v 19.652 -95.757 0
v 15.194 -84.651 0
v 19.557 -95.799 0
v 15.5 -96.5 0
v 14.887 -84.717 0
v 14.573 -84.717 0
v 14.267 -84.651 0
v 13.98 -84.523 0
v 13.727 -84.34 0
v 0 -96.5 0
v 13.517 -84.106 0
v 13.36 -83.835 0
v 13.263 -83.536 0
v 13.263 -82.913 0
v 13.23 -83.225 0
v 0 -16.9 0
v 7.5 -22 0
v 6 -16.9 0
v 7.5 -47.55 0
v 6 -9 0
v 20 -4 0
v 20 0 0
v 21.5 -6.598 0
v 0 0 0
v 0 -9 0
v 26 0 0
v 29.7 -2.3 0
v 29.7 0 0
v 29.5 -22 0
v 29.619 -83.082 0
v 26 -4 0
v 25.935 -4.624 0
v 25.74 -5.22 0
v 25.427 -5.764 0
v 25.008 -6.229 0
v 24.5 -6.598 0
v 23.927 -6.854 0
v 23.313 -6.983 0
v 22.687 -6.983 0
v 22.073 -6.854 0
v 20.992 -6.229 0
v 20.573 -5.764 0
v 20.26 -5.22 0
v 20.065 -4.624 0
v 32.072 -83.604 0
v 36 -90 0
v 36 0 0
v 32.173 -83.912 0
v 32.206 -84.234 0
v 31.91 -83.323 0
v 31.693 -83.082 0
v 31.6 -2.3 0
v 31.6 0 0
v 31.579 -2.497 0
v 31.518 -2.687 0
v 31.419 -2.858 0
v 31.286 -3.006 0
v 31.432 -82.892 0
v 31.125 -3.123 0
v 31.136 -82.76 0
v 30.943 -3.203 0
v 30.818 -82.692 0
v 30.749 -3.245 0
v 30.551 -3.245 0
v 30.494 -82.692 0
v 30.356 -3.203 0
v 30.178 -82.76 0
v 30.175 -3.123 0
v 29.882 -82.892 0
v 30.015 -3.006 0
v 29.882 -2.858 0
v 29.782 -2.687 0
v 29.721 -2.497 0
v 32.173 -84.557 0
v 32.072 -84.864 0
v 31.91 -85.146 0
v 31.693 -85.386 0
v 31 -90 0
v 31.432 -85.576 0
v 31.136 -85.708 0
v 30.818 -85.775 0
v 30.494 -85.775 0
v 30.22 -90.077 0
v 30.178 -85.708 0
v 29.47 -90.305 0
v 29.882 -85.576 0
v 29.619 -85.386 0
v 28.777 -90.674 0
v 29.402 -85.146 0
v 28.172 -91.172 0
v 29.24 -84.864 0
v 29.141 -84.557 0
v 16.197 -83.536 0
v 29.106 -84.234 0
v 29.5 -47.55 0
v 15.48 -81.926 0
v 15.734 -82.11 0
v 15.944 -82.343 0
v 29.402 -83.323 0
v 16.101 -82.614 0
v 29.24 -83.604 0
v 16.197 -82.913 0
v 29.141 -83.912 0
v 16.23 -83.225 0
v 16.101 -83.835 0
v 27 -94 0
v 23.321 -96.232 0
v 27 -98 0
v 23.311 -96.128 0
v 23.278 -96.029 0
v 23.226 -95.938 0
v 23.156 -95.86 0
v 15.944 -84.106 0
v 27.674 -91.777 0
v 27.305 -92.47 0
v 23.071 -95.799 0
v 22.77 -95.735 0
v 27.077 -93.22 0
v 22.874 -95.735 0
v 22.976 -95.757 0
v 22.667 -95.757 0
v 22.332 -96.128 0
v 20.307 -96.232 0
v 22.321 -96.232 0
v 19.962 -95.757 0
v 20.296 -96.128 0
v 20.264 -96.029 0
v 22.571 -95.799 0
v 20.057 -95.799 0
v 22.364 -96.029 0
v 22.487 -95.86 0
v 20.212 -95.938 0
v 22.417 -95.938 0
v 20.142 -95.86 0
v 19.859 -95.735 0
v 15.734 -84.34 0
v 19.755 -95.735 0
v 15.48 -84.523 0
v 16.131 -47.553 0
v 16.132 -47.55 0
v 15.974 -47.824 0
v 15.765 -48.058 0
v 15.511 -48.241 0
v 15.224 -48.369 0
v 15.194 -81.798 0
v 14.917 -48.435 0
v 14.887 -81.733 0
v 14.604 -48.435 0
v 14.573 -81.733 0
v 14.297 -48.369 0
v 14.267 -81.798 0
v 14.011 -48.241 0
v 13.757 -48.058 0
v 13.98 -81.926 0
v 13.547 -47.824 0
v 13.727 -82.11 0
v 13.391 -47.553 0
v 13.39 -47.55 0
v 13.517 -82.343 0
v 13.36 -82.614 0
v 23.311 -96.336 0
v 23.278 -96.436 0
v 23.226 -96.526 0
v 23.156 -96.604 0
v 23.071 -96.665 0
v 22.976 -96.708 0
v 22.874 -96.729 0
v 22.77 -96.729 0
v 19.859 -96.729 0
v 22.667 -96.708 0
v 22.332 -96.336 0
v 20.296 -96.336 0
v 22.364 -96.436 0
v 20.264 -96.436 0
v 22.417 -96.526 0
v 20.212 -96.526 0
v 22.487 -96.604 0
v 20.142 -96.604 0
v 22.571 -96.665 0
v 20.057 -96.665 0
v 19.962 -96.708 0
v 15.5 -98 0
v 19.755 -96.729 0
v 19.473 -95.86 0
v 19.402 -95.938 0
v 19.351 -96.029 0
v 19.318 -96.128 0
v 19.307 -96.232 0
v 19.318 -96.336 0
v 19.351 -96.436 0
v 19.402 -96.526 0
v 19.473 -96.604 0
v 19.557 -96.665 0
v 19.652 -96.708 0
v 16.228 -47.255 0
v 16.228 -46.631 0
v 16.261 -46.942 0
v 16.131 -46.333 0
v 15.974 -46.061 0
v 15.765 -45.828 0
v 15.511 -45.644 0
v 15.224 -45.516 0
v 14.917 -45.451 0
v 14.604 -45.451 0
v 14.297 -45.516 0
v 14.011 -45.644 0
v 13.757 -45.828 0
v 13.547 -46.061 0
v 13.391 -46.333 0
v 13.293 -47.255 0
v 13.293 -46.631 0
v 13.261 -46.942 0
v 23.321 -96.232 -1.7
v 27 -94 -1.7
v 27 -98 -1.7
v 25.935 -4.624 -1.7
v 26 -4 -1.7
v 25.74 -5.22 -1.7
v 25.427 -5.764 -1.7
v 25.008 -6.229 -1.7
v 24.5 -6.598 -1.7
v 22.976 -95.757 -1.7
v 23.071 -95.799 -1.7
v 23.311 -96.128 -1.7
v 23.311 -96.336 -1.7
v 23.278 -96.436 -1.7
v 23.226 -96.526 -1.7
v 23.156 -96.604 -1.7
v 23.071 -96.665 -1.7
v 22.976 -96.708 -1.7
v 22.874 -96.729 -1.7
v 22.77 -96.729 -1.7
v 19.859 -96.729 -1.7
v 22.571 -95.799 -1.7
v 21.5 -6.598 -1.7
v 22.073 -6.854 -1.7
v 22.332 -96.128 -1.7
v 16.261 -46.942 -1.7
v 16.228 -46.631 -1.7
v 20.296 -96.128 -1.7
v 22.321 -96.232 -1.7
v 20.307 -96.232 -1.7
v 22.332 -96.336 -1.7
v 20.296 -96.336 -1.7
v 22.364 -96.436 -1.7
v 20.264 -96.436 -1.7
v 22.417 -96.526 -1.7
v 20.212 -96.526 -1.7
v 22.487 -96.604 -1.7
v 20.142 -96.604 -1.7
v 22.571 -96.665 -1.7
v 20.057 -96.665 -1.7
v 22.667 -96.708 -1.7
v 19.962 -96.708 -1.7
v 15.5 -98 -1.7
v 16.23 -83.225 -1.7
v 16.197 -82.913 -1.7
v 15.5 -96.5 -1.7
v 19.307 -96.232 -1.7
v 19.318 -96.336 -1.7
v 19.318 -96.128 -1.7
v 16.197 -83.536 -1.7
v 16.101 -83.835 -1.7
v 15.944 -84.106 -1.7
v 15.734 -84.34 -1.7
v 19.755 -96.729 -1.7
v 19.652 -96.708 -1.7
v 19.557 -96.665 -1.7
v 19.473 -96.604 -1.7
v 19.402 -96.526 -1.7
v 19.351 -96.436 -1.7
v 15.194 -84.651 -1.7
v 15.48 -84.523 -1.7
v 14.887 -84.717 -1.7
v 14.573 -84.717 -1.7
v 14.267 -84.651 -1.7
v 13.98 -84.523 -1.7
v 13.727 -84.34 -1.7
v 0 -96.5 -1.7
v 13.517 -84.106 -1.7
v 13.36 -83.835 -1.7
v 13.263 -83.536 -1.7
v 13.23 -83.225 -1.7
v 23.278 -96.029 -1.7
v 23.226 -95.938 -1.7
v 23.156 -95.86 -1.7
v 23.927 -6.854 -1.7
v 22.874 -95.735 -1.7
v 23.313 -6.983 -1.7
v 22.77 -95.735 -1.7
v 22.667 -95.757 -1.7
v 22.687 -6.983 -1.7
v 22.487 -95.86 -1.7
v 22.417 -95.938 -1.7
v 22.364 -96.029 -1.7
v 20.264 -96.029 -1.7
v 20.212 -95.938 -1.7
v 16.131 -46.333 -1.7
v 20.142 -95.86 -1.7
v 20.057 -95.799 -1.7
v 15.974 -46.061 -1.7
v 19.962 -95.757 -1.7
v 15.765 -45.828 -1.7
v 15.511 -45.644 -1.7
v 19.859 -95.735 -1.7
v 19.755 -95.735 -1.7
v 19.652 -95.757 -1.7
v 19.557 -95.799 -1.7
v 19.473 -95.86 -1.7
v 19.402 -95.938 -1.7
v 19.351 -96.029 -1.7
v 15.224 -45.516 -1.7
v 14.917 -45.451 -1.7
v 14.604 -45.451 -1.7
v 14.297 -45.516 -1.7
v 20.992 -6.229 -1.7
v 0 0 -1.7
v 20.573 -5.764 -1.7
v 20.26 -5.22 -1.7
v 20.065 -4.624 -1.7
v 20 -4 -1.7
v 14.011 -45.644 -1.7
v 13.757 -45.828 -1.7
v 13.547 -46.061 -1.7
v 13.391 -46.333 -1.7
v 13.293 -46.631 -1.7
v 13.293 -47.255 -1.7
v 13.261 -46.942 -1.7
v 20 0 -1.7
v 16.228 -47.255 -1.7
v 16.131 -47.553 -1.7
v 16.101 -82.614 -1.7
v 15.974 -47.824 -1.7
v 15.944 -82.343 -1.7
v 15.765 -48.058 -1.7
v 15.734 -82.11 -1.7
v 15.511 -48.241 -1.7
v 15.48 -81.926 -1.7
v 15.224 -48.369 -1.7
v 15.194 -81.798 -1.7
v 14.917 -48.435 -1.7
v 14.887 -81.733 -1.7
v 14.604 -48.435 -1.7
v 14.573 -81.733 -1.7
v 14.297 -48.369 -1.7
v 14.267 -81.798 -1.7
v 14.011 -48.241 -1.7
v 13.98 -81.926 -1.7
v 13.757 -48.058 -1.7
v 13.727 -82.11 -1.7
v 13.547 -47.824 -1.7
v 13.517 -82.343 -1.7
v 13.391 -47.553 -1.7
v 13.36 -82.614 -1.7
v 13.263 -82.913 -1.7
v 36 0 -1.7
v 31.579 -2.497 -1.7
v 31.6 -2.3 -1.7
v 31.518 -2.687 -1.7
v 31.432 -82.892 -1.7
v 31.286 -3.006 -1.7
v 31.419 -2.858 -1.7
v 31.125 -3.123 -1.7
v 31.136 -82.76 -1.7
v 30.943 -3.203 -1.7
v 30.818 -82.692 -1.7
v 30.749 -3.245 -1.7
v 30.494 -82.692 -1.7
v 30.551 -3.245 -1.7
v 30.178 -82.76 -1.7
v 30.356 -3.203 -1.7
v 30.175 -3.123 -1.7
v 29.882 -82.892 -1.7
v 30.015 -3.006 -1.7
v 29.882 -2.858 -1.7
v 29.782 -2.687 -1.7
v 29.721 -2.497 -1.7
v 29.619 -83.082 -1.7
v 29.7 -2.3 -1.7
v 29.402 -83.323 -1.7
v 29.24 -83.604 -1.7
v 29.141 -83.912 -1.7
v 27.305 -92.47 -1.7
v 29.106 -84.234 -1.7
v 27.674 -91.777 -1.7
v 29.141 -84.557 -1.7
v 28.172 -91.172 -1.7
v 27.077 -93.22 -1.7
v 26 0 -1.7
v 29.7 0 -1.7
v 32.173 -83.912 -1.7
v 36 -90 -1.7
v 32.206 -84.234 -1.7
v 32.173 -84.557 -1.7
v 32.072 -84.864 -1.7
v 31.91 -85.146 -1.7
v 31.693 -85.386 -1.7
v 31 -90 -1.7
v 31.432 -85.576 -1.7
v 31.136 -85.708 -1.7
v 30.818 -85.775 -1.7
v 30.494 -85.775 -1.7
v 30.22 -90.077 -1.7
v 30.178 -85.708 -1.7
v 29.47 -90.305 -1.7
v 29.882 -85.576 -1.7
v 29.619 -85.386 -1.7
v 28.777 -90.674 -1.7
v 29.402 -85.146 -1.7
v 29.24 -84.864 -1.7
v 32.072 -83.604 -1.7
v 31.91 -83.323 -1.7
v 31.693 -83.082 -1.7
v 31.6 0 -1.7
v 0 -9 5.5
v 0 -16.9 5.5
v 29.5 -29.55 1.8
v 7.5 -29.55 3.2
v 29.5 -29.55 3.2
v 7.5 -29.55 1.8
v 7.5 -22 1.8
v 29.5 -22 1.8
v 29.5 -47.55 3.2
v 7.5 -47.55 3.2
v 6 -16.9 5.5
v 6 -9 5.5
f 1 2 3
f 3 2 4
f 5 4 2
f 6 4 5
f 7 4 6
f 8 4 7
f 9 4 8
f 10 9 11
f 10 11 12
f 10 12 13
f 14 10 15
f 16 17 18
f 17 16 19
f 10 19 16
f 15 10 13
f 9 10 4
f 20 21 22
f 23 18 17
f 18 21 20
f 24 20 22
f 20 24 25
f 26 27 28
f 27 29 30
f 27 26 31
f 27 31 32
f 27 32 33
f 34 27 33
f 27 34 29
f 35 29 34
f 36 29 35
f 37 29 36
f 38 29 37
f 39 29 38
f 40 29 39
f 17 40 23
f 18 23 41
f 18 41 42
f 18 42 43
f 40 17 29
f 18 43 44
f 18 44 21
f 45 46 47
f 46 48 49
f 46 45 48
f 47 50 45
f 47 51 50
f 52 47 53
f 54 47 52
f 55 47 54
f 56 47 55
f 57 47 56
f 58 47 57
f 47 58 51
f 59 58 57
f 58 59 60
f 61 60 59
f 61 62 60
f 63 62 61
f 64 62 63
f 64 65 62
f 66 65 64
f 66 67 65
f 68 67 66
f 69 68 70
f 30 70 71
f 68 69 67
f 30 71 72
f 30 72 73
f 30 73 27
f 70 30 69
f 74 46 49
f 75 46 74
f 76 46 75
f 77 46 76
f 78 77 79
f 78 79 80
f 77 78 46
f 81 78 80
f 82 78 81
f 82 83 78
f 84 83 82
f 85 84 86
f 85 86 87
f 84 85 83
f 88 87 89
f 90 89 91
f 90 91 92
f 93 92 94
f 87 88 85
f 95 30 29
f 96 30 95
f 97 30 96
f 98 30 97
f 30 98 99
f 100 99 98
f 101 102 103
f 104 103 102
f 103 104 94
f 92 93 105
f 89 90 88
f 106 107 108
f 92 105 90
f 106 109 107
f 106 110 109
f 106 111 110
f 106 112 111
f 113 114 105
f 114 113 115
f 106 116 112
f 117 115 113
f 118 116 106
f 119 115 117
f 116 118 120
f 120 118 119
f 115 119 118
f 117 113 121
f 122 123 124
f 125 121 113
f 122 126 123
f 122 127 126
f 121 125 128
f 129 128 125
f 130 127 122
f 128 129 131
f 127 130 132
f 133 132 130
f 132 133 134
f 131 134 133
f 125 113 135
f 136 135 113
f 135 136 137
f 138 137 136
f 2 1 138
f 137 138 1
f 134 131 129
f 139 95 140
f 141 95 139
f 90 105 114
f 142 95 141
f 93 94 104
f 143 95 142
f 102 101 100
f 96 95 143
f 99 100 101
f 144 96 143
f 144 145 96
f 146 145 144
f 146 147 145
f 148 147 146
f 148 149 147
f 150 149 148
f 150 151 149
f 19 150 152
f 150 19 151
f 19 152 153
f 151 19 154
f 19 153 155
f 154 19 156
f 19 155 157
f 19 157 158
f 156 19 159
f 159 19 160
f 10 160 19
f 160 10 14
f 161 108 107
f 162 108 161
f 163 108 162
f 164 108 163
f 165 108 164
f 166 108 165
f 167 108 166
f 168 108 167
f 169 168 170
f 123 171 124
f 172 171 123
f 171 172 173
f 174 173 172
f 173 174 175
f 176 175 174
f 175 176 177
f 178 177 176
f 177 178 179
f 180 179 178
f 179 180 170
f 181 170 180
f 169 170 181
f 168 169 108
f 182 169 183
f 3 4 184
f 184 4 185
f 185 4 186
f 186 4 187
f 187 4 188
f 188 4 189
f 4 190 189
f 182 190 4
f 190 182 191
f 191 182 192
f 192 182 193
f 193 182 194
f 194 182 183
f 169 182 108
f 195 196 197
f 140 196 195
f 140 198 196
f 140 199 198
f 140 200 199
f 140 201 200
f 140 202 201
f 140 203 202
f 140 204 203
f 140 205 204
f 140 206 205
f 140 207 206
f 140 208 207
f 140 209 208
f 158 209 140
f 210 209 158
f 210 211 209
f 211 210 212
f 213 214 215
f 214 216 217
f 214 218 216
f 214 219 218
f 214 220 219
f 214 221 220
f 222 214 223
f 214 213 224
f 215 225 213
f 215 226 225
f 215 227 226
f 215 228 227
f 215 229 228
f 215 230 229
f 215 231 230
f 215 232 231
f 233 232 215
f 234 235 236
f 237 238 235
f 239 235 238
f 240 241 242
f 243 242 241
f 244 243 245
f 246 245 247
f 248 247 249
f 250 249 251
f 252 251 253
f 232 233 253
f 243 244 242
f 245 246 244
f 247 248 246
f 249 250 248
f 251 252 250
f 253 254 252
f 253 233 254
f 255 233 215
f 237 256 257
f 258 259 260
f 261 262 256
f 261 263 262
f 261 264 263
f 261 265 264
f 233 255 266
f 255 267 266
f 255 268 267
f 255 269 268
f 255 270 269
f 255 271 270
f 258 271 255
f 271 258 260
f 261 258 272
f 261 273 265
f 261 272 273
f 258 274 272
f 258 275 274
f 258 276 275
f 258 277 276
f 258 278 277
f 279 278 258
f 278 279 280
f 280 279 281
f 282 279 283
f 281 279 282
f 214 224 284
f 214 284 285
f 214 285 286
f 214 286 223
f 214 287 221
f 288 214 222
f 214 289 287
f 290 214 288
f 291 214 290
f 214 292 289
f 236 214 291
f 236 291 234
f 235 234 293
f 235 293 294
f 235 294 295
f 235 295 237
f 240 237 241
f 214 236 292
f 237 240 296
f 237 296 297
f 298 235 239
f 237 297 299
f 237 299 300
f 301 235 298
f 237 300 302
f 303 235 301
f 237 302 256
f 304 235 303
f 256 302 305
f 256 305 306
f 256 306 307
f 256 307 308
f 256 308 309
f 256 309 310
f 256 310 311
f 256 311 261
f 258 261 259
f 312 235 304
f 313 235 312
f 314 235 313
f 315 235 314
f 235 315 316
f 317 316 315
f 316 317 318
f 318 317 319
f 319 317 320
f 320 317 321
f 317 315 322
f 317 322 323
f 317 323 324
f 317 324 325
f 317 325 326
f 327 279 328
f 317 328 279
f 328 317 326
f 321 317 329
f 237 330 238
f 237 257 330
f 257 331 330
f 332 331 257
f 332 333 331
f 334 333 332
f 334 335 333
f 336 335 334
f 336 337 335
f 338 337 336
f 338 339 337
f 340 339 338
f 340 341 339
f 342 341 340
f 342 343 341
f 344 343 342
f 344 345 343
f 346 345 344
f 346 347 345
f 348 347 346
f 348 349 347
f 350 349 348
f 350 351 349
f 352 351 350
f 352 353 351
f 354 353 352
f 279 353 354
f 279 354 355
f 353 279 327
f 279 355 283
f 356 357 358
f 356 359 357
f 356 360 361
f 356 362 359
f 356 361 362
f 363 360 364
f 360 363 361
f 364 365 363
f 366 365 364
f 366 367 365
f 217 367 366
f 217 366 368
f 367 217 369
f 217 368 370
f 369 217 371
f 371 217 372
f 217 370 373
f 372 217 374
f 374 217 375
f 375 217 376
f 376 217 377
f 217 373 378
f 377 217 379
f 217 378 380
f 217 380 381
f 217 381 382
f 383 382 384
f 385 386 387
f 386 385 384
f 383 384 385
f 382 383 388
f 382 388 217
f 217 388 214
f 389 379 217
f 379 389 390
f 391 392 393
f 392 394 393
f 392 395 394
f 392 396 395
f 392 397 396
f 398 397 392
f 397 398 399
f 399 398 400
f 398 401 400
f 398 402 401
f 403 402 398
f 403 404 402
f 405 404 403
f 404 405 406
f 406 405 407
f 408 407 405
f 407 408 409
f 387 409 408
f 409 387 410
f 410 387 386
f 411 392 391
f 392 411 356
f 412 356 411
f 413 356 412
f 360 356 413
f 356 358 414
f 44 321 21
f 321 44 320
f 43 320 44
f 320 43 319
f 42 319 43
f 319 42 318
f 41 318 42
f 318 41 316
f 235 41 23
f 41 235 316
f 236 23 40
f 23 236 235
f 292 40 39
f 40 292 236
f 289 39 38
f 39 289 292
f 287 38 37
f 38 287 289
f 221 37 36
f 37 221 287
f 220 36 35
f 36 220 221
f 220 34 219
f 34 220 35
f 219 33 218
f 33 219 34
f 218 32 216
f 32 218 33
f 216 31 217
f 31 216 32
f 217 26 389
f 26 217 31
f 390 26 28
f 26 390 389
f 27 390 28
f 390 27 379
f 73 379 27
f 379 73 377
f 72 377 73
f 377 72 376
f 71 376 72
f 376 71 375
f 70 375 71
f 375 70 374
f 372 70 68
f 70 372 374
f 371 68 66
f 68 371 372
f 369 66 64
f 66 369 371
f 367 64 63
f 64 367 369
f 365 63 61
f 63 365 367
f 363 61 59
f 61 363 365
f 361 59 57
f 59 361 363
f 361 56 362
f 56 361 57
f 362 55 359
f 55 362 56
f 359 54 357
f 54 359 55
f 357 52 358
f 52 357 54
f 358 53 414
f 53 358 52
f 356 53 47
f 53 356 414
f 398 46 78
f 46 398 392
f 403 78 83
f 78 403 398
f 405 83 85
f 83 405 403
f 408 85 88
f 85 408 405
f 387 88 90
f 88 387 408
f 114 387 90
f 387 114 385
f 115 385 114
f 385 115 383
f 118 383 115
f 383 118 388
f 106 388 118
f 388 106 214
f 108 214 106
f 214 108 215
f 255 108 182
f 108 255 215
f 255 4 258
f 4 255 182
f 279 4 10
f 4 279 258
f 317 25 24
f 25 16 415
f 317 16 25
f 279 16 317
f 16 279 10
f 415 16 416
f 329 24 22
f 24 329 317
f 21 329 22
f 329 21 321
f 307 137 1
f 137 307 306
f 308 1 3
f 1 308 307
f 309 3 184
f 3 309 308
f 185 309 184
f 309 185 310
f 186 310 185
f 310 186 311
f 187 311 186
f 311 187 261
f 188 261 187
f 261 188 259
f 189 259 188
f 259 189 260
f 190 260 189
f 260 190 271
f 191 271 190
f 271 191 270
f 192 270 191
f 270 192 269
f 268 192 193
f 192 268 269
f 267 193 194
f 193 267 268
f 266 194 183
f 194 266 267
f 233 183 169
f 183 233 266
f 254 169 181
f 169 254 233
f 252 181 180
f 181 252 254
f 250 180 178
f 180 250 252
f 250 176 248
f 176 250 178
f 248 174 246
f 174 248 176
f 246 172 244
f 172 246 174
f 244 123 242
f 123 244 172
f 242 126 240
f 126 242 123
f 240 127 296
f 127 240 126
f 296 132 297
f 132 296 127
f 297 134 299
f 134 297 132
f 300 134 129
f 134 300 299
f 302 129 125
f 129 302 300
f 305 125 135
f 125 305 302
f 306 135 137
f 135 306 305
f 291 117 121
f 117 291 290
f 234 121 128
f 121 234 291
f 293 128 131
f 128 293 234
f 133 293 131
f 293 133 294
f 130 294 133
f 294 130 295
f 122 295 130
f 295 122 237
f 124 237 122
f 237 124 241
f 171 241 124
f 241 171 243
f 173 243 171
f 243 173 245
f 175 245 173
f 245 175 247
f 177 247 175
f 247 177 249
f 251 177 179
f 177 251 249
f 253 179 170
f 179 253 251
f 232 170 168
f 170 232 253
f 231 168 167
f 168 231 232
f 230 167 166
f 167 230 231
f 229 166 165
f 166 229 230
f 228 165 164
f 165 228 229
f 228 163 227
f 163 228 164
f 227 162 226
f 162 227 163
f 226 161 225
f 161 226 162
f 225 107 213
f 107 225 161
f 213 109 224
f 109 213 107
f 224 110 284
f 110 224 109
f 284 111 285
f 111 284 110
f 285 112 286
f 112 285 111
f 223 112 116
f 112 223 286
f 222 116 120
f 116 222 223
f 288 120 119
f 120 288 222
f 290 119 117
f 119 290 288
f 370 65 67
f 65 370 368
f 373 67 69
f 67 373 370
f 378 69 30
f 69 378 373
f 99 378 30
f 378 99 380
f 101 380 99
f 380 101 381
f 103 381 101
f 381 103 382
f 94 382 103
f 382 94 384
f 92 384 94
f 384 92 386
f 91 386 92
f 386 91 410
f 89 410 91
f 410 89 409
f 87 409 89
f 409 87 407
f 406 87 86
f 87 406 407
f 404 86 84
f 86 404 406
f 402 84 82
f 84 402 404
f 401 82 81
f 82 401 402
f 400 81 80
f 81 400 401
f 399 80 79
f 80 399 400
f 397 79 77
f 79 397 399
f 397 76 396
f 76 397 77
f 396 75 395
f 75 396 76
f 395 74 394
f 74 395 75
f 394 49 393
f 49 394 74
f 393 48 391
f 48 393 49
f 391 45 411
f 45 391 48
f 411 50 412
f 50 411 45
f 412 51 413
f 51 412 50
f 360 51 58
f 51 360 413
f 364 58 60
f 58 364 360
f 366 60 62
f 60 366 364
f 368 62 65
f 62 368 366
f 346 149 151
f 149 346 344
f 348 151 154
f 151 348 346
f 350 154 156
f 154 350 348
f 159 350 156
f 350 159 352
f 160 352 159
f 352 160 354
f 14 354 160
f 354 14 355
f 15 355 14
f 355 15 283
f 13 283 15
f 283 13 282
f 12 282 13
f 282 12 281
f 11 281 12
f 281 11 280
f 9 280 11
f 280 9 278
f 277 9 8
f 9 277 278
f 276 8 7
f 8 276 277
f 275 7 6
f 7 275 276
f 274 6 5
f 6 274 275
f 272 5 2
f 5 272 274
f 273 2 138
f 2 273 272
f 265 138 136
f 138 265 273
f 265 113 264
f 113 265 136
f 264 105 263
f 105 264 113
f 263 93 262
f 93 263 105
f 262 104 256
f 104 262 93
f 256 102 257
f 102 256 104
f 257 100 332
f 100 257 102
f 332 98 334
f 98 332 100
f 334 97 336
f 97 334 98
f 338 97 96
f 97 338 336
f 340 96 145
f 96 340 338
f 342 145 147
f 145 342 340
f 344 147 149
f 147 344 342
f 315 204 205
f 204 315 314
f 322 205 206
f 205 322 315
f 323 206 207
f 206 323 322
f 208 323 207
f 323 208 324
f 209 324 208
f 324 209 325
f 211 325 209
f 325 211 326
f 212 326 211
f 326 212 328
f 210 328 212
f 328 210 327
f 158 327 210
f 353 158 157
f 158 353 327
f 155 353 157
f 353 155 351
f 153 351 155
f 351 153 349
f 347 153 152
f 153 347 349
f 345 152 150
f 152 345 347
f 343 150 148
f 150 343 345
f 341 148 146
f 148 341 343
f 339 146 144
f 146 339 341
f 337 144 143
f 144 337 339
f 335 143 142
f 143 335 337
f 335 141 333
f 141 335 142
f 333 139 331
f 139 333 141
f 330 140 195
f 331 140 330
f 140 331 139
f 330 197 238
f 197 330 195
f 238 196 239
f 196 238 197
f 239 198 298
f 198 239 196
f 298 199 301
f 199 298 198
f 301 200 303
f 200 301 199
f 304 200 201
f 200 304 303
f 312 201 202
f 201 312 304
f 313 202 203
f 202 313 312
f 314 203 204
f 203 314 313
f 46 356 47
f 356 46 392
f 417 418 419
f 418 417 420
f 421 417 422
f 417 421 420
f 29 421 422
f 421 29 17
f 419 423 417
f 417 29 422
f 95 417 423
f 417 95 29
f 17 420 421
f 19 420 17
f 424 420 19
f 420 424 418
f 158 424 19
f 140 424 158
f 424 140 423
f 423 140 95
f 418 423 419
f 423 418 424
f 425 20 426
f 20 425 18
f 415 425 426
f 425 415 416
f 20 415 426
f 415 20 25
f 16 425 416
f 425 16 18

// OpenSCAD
// file: components.scad
height_MDT420E02001=4.2;  // MDT420E02001
height_MDT245E02001=1.8;  // MDT245E02001
height_MDT180E02001=1.8;  // MDT180E02001

module m2_micromod(height) {
  width = 22;
  length = 5.275 + 2.275;

  union() {
    cube([length, width, height], false);
    translate([length, 0,0]) {
      cube([18, width, height + 1.4], false);
    }
  }
}

module jst_ph_2pin() {
  translate([0, -7.9, 0]) {
    cube([6, 7.9, 5.5], false);
  }
}
// main file
include <components.scad>

$fn=30;
pcb_height=1.7;
pcb_depth=36;  // min is 35

module pcb_base(thickness) {
  linear_extrude(height=thickness, center=false, convexity=10) {
    difference() {
      import (file="pcb-cad.dxf", layer="outline");
      import (file="pcb-cad.dxf", layer="details");
    }
  }
}

module pcb(thickness, full_depth) {
  scale([1,-1,-1]) {
    union() {
      pcb_base(thickness);

      translate([35,0,0]) {
        cube([full_depth - 35, 90, thickness], center=false);
      }

    }
  }
}

module populated_pcb(thickness, depth) {
  pcb(thickness, depth);

  // pcb components
  translate([7.5, -22, 0]) {
    rotate([0,0,-90]) {
      m2_micromod(height_MDT245E02001);
    }
  }

  translate([0,-9,0]) {
    jst_ph_2pin();
  }
}

populated_pcb(pcb_height, pcb_depth);
